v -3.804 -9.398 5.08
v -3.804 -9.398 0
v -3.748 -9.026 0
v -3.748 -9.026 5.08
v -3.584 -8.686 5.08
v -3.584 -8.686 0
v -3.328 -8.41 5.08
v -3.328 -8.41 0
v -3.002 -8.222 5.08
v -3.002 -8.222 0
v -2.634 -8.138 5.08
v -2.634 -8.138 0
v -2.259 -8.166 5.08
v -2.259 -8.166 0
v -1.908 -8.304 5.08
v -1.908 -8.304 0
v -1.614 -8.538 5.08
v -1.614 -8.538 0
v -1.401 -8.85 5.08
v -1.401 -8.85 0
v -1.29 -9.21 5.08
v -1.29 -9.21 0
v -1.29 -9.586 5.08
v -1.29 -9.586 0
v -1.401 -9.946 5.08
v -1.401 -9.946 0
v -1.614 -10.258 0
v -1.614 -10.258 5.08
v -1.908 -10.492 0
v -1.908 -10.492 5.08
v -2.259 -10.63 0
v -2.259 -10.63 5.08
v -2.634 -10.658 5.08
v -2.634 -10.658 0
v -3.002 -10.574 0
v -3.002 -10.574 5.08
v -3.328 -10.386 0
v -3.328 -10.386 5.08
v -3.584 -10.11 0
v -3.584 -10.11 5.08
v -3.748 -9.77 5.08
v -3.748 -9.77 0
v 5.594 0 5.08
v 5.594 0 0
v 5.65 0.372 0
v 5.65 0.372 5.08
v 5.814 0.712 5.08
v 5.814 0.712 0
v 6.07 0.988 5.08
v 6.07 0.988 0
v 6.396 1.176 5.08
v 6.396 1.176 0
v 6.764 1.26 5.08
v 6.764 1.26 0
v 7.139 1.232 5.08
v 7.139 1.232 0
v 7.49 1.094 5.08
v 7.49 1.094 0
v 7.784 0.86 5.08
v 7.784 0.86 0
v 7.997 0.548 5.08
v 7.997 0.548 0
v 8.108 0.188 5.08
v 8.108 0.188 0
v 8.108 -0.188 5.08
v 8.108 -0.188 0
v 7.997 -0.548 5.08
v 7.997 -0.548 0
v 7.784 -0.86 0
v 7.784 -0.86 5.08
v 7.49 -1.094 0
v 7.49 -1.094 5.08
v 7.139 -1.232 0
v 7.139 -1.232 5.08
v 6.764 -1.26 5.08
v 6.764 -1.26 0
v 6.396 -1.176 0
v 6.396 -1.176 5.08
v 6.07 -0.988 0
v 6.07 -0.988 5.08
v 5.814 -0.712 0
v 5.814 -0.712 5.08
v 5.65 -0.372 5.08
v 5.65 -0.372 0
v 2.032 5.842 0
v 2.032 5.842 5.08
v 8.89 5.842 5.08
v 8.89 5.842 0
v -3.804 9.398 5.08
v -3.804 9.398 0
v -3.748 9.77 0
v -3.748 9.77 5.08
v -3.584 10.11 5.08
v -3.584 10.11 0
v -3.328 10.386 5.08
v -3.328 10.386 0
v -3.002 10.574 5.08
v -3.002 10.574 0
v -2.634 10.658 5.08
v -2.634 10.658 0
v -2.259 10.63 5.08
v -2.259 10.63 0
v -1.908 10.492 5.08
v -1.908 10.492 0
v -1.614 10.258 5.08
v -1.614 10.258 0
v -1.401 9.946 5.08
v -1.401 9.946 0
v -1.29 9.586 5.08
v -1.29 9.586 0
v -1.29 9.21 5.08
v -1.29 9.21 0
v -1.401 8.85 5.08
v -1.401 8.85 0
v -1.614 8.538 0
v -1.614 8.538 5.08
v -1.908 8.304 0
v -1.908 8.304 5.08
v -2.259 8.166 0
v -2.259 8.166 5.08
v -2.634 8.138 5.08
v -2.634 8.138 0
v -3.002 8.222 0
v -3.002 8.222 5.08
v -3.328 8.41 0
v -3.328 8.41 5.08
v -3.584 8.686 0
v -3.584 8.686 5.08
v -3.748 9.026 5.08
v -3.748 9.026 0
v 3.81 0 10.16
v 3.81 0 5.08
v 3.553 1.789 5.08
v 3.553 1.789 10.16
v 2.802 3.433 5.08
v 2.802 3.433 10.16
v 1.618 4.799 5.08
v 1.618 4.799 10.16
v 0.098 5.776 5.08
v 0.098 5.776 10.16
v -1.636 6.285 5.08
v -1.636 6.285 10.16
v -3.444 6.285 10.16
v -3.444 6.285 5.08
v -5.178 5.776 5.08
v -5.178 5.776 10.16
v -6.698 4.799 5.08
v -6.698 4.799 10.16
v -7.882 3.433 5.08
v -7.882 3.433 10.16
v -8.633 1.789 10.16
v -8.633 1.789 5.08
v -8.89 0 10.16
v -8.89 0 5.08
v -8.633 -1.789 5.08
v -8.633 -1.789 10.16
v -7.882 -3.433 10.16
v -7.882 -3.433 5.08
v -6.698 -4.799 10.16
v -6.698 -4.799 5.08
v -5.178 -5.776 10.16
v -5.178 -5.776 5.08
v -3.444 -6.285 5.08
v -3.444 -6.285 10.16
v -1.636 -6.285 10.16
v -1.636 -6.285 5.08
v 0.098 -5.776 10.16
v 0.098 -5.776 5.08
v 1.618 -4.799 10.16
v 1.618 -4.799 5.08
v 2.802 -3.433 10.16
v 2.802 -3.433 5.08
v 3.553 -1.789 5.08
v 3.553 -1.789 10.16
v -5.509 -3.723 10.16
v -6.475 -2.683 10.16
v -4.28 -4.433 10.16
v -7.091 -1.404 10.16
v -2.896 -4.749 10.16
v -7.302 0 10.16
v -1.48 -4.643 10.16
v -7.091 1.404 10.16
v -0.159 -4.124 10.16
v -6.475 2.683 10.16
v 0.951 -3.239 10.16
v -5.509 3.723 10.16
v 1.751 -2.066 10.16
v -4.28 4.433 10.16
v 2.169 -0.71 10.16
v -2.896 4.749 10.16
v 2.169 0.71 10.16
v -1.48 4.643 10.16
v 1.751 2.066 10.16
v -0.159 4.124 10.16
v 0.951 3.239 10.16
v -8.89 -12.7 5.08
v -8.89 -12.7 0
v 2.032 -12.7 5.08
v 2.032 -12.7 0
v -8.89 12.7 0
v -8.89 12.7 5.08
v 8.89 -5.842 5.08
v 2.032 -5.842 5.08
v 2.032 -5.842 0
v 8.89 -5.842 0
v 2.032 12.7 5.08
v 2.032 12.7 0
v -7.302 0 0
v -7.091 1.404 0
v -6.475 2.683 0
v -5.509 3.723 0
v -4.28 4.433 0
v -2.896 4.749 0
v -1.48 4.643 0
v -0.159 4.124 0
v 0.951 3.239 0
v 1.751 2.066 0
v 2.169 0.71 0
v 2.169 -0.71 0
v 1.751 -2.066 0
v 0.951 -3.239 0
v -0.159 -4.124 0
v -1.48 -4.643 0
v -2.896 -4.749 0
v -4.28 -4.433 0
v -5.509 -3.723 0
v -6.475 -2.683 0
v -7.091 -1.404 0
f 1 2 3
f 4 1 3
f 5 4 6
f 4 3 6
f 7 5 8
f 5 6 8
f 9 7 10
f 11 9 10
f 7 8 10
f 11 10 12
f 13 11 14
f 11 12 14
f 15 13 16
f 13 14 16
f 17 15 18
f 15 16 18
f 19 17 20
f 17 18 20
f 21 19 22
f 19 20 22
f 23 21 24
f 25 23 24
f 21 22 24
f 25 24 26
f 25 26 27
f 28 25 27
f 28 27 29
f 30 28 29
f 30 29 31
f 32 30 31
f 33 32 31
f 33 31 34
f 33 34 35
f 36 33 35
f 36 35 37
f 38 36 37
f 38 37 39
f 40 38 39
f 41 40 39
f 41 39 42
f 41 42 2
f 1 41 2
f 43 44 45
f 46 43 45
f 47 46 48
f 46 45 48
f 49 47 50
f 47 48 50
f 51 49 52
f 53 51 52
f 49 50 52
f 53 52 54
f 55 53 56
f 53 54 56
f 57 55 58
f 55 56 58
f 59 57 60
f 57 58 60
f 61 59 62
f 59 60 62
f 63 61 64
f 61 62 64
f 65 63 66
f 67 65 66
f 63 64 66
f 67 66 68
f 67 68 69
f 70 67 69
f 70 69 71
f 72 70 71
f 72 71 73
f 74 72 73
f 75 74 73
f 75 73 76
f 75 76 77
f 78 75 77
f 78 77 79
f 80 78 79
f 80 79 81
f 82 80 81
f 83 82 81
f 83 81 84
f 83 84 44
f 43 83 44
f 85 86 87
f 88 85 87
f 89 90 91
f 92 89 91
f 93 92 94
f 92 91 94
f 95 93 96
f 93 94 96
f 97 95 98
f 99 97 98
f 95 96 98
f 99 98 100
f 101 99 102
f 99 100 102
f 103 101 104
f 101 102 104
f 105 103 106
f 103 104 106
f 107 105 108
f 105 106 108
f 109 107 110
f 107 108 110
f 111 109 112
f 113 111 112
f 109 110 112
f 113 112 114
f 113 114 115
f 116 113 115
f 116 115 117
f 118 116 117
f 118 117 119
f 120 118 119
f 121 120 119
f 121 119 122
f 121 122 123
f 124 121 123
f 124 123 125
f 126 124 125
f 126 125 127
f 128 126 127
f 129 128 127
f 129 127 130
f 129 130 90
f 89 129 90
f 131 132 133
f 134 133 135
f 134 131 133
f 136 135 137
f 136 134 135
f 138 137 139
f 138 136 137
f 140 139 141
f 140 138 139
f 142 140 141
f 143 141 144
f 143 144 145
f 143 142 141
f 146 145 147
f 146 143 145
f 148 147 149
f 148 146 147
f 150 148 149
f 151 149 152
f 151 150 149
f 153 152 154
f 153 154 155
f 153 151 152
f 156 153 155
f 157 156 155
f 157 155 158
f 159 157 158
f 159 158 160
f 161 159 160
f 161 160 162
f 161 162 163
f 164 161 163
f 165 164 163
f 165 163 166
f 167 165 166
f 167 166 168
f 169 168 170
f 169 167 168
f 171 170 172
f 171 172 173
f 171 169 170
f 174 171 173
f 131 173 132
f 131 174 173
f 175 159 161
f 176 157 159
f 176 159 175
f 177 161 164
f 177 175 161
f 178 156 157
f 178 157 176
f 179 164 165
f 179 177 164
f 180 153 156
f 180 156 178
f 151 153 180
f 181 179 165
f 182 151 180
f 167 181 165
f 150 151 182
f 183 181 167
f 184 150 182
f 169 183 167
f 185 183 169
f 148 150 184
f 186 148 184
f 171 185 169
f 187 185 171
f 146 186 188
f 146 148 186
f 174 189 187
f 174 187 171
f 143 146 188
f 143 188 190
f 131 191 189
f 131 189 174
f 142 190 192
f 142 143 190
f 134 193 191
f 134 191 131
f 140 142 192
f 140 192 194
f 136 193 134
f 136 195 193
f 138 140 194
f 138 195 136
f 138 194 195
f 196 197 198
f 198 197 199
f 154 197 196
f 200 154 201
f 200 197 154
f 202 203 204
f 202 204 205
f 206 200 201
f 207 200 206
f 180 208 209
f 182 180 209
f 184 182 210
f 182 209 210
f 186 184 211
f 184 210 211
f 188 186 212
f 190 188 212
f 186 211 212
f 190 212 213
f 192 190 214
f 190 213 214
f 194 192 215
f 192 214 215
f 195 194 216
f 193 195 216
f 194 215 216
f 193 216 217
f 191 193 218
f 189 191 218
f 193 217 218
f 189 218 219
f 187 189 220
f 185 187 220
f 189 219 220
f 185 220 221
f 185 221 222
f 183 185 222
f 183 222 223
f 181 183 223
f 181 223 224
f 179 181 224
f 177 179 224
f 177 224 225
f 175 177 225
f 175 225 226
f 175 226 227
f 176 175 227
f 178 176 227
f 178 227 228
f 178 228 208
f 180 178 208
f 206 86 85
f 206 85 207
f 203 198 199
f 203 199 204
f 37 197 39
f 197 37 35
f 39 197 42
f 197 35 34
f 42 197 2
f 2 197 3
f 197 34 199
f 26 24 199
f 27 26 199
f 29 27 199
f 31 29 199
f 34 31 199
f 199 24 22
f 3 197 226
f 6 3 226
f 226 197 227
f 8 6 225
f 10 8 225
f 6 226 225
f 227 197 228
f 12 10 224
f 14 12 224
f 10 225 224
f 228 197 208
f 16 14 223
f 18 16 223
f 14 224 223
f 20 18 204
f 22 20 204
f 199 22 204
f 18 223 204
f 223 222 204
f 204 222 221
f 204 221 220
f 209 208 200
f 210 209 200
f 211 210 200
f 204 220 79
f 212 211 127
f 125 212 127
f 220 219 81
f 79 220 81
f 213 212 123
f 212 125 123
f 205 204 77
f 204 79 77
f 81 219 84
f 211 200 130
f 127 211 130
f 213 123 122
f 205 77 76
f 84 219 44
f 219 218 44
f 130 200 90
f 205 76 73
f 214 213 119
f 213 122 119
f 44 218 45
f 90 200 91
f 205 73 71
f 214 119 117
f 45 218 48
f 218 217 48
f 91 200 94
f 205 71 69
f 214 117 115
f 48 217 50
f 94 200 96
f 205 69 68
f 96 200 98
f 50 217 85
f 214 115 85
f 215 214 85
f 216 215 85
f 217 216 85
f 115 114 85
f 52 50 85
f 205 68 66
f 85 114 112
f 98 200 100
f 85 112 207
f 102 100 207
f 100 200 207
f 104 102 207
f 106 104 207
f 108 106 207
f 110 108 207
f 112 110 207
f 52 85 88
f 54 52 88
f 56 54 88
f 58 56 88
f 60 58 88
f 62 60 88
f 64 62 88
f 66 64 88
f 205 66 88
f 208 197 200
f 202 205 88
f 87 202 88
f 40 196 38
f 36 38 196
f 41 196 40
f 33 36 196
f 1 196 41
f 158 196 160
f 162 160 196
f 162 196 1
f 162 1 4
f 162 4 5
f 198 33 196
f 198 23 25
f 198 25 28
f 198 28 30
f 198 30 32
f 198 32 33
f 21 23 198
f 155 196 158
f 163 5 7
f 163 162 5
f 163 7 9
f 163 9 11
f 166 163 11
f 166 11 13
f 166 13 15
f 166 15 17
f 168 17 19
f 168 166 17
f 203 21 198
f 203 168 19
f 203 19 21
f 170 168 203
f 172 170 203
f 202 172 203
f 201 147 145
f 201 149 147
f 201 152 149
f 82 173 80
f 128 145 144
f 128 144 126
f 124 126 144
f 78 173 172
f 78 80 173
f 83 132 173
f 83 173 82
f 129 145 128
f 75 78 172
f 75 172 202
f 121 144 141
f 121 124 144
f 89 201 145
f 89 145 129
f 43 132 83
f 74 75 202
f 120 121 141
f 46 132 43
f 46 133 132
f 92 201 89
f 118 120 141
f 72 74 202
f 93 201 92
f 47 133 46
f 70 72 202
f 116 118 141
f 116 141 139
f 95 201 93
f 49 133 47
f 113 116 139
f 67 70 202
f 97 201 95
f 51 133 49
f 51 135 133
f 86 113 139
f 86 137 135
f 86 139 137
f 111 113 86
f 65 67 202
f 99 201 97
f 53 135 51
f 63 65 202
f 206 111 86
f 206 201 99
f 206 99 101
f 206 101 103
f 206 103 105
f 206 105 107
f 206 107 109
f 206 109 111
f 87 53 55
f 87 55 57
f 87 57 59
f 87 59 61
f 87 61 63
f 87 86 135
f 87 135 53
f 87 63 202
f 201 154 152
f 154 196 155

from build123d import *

# Parameters (mm, degrees)
SKETCH1_W                        = 17.78
SKETCH1_H                        = 25.4
EXTRUDE1_DEPTH                   = 10.16
F_3_8_0_375_DIAMETER_HOLE1_D     = 9.525
F_3_8_0_375_DIAMETER_HOLE1_DEPTH = 12.7
F_3_8_0_375_DIAMETER_HOLE1_TIP   = 2.861598698
SKETCH11_OUTSIDE_W               = 26.306
SKETCH11_OUTSIDE_H               = 33.926
SKETCH11_OUTSIDE_R               = 6.35
EXTRUDE3_DEPTH                   = 5.08
F_39_0_0995_DIAMETER_HOLE1_D     = 2.5273
SKETCH14_W                       = 6.858
SKETCH14_H                       = 6.858
EXTRUDE4_DEPTH                   = 6.08


with BuildPart() as part:
    # Sketch1 → Extrude1 (new body)
    with BuildSketch(Plane.XY):
        Rectangle(SKETCH1_W, SKETCH1_H)
    extrude(amount=EXTRUDE1_DEPTH)

    # 3/8 (0.375) Diameter Hole1
    with Locations(Plane(origin=(-2.54, 0, 10.16), x_dir=(1, 0, 0), z_dir=(0, 0, 1))):
        with Locations((0, 0)):
            Hole(F_3_8_0_375_DIAMETER_HOLE1_D / 2, depth=F_3_8_0_375_DIAMETER_HOLE1_DEPTH)
            with Locations((0, 0, -(F_3_8_0_375_DIAMETER_HOLE1_DEPTH + F_3_8_0_375_DIAMETER_HOLE1_TIP / 2))):  # 118° drill point
                Cone(0, F_3_8_0_375_DIAMETER_HOLE1_D / 2, F_3_8_0_375_DIAMETER_HOLE1_TIP, mode=Mode.SUBTRACT)

    # Sketch11 outside → Extrude3 (cut)
    with BuildSketch(Plane.XY.offset(10.16)):
        Rectangle(SKETCH11_OUTSIDE_W, SKETCH11_OUTSIDE_H)
        with Locations((-2.54, 0)):
            Circle(SKETCH11_OUTSIDE_R, mode=Mode.SUBTRACT)
    extrude(amount=-EXTRUDE3_DEPTH, mode=Mode.SUBTRACT)

    # #39 (0.0995) Diameter Hole1 (through all)
    with Locations(Plane(origin=(6.858, 0, 10.16), x_dir=(1, 0, 0), z_dir=(0, 0, 1))):
        with Locations((0, 0), (-9.398, -9.398), (-9.398, 9.398)):
            Hole(F_39_0_0995_DIAMETER_HOLE1_D / 2)

    # Sketch14 → Extrude4 (cut, through all)
    with BuildSketch(Plane.XY.offset(5.08)):
        with Locations((5.461, 9.271)):
            Rectangle(SKETCH14_W, SKETCH14_H)
        with Locations((5.461, -9.271)):
            Rectangle(SKETCH14_W, SKETCH14_H)
    extrude(amount=-EXTRUDE4_DEPTH, mode=Mode.SUBTRACT)


solid = part.part
